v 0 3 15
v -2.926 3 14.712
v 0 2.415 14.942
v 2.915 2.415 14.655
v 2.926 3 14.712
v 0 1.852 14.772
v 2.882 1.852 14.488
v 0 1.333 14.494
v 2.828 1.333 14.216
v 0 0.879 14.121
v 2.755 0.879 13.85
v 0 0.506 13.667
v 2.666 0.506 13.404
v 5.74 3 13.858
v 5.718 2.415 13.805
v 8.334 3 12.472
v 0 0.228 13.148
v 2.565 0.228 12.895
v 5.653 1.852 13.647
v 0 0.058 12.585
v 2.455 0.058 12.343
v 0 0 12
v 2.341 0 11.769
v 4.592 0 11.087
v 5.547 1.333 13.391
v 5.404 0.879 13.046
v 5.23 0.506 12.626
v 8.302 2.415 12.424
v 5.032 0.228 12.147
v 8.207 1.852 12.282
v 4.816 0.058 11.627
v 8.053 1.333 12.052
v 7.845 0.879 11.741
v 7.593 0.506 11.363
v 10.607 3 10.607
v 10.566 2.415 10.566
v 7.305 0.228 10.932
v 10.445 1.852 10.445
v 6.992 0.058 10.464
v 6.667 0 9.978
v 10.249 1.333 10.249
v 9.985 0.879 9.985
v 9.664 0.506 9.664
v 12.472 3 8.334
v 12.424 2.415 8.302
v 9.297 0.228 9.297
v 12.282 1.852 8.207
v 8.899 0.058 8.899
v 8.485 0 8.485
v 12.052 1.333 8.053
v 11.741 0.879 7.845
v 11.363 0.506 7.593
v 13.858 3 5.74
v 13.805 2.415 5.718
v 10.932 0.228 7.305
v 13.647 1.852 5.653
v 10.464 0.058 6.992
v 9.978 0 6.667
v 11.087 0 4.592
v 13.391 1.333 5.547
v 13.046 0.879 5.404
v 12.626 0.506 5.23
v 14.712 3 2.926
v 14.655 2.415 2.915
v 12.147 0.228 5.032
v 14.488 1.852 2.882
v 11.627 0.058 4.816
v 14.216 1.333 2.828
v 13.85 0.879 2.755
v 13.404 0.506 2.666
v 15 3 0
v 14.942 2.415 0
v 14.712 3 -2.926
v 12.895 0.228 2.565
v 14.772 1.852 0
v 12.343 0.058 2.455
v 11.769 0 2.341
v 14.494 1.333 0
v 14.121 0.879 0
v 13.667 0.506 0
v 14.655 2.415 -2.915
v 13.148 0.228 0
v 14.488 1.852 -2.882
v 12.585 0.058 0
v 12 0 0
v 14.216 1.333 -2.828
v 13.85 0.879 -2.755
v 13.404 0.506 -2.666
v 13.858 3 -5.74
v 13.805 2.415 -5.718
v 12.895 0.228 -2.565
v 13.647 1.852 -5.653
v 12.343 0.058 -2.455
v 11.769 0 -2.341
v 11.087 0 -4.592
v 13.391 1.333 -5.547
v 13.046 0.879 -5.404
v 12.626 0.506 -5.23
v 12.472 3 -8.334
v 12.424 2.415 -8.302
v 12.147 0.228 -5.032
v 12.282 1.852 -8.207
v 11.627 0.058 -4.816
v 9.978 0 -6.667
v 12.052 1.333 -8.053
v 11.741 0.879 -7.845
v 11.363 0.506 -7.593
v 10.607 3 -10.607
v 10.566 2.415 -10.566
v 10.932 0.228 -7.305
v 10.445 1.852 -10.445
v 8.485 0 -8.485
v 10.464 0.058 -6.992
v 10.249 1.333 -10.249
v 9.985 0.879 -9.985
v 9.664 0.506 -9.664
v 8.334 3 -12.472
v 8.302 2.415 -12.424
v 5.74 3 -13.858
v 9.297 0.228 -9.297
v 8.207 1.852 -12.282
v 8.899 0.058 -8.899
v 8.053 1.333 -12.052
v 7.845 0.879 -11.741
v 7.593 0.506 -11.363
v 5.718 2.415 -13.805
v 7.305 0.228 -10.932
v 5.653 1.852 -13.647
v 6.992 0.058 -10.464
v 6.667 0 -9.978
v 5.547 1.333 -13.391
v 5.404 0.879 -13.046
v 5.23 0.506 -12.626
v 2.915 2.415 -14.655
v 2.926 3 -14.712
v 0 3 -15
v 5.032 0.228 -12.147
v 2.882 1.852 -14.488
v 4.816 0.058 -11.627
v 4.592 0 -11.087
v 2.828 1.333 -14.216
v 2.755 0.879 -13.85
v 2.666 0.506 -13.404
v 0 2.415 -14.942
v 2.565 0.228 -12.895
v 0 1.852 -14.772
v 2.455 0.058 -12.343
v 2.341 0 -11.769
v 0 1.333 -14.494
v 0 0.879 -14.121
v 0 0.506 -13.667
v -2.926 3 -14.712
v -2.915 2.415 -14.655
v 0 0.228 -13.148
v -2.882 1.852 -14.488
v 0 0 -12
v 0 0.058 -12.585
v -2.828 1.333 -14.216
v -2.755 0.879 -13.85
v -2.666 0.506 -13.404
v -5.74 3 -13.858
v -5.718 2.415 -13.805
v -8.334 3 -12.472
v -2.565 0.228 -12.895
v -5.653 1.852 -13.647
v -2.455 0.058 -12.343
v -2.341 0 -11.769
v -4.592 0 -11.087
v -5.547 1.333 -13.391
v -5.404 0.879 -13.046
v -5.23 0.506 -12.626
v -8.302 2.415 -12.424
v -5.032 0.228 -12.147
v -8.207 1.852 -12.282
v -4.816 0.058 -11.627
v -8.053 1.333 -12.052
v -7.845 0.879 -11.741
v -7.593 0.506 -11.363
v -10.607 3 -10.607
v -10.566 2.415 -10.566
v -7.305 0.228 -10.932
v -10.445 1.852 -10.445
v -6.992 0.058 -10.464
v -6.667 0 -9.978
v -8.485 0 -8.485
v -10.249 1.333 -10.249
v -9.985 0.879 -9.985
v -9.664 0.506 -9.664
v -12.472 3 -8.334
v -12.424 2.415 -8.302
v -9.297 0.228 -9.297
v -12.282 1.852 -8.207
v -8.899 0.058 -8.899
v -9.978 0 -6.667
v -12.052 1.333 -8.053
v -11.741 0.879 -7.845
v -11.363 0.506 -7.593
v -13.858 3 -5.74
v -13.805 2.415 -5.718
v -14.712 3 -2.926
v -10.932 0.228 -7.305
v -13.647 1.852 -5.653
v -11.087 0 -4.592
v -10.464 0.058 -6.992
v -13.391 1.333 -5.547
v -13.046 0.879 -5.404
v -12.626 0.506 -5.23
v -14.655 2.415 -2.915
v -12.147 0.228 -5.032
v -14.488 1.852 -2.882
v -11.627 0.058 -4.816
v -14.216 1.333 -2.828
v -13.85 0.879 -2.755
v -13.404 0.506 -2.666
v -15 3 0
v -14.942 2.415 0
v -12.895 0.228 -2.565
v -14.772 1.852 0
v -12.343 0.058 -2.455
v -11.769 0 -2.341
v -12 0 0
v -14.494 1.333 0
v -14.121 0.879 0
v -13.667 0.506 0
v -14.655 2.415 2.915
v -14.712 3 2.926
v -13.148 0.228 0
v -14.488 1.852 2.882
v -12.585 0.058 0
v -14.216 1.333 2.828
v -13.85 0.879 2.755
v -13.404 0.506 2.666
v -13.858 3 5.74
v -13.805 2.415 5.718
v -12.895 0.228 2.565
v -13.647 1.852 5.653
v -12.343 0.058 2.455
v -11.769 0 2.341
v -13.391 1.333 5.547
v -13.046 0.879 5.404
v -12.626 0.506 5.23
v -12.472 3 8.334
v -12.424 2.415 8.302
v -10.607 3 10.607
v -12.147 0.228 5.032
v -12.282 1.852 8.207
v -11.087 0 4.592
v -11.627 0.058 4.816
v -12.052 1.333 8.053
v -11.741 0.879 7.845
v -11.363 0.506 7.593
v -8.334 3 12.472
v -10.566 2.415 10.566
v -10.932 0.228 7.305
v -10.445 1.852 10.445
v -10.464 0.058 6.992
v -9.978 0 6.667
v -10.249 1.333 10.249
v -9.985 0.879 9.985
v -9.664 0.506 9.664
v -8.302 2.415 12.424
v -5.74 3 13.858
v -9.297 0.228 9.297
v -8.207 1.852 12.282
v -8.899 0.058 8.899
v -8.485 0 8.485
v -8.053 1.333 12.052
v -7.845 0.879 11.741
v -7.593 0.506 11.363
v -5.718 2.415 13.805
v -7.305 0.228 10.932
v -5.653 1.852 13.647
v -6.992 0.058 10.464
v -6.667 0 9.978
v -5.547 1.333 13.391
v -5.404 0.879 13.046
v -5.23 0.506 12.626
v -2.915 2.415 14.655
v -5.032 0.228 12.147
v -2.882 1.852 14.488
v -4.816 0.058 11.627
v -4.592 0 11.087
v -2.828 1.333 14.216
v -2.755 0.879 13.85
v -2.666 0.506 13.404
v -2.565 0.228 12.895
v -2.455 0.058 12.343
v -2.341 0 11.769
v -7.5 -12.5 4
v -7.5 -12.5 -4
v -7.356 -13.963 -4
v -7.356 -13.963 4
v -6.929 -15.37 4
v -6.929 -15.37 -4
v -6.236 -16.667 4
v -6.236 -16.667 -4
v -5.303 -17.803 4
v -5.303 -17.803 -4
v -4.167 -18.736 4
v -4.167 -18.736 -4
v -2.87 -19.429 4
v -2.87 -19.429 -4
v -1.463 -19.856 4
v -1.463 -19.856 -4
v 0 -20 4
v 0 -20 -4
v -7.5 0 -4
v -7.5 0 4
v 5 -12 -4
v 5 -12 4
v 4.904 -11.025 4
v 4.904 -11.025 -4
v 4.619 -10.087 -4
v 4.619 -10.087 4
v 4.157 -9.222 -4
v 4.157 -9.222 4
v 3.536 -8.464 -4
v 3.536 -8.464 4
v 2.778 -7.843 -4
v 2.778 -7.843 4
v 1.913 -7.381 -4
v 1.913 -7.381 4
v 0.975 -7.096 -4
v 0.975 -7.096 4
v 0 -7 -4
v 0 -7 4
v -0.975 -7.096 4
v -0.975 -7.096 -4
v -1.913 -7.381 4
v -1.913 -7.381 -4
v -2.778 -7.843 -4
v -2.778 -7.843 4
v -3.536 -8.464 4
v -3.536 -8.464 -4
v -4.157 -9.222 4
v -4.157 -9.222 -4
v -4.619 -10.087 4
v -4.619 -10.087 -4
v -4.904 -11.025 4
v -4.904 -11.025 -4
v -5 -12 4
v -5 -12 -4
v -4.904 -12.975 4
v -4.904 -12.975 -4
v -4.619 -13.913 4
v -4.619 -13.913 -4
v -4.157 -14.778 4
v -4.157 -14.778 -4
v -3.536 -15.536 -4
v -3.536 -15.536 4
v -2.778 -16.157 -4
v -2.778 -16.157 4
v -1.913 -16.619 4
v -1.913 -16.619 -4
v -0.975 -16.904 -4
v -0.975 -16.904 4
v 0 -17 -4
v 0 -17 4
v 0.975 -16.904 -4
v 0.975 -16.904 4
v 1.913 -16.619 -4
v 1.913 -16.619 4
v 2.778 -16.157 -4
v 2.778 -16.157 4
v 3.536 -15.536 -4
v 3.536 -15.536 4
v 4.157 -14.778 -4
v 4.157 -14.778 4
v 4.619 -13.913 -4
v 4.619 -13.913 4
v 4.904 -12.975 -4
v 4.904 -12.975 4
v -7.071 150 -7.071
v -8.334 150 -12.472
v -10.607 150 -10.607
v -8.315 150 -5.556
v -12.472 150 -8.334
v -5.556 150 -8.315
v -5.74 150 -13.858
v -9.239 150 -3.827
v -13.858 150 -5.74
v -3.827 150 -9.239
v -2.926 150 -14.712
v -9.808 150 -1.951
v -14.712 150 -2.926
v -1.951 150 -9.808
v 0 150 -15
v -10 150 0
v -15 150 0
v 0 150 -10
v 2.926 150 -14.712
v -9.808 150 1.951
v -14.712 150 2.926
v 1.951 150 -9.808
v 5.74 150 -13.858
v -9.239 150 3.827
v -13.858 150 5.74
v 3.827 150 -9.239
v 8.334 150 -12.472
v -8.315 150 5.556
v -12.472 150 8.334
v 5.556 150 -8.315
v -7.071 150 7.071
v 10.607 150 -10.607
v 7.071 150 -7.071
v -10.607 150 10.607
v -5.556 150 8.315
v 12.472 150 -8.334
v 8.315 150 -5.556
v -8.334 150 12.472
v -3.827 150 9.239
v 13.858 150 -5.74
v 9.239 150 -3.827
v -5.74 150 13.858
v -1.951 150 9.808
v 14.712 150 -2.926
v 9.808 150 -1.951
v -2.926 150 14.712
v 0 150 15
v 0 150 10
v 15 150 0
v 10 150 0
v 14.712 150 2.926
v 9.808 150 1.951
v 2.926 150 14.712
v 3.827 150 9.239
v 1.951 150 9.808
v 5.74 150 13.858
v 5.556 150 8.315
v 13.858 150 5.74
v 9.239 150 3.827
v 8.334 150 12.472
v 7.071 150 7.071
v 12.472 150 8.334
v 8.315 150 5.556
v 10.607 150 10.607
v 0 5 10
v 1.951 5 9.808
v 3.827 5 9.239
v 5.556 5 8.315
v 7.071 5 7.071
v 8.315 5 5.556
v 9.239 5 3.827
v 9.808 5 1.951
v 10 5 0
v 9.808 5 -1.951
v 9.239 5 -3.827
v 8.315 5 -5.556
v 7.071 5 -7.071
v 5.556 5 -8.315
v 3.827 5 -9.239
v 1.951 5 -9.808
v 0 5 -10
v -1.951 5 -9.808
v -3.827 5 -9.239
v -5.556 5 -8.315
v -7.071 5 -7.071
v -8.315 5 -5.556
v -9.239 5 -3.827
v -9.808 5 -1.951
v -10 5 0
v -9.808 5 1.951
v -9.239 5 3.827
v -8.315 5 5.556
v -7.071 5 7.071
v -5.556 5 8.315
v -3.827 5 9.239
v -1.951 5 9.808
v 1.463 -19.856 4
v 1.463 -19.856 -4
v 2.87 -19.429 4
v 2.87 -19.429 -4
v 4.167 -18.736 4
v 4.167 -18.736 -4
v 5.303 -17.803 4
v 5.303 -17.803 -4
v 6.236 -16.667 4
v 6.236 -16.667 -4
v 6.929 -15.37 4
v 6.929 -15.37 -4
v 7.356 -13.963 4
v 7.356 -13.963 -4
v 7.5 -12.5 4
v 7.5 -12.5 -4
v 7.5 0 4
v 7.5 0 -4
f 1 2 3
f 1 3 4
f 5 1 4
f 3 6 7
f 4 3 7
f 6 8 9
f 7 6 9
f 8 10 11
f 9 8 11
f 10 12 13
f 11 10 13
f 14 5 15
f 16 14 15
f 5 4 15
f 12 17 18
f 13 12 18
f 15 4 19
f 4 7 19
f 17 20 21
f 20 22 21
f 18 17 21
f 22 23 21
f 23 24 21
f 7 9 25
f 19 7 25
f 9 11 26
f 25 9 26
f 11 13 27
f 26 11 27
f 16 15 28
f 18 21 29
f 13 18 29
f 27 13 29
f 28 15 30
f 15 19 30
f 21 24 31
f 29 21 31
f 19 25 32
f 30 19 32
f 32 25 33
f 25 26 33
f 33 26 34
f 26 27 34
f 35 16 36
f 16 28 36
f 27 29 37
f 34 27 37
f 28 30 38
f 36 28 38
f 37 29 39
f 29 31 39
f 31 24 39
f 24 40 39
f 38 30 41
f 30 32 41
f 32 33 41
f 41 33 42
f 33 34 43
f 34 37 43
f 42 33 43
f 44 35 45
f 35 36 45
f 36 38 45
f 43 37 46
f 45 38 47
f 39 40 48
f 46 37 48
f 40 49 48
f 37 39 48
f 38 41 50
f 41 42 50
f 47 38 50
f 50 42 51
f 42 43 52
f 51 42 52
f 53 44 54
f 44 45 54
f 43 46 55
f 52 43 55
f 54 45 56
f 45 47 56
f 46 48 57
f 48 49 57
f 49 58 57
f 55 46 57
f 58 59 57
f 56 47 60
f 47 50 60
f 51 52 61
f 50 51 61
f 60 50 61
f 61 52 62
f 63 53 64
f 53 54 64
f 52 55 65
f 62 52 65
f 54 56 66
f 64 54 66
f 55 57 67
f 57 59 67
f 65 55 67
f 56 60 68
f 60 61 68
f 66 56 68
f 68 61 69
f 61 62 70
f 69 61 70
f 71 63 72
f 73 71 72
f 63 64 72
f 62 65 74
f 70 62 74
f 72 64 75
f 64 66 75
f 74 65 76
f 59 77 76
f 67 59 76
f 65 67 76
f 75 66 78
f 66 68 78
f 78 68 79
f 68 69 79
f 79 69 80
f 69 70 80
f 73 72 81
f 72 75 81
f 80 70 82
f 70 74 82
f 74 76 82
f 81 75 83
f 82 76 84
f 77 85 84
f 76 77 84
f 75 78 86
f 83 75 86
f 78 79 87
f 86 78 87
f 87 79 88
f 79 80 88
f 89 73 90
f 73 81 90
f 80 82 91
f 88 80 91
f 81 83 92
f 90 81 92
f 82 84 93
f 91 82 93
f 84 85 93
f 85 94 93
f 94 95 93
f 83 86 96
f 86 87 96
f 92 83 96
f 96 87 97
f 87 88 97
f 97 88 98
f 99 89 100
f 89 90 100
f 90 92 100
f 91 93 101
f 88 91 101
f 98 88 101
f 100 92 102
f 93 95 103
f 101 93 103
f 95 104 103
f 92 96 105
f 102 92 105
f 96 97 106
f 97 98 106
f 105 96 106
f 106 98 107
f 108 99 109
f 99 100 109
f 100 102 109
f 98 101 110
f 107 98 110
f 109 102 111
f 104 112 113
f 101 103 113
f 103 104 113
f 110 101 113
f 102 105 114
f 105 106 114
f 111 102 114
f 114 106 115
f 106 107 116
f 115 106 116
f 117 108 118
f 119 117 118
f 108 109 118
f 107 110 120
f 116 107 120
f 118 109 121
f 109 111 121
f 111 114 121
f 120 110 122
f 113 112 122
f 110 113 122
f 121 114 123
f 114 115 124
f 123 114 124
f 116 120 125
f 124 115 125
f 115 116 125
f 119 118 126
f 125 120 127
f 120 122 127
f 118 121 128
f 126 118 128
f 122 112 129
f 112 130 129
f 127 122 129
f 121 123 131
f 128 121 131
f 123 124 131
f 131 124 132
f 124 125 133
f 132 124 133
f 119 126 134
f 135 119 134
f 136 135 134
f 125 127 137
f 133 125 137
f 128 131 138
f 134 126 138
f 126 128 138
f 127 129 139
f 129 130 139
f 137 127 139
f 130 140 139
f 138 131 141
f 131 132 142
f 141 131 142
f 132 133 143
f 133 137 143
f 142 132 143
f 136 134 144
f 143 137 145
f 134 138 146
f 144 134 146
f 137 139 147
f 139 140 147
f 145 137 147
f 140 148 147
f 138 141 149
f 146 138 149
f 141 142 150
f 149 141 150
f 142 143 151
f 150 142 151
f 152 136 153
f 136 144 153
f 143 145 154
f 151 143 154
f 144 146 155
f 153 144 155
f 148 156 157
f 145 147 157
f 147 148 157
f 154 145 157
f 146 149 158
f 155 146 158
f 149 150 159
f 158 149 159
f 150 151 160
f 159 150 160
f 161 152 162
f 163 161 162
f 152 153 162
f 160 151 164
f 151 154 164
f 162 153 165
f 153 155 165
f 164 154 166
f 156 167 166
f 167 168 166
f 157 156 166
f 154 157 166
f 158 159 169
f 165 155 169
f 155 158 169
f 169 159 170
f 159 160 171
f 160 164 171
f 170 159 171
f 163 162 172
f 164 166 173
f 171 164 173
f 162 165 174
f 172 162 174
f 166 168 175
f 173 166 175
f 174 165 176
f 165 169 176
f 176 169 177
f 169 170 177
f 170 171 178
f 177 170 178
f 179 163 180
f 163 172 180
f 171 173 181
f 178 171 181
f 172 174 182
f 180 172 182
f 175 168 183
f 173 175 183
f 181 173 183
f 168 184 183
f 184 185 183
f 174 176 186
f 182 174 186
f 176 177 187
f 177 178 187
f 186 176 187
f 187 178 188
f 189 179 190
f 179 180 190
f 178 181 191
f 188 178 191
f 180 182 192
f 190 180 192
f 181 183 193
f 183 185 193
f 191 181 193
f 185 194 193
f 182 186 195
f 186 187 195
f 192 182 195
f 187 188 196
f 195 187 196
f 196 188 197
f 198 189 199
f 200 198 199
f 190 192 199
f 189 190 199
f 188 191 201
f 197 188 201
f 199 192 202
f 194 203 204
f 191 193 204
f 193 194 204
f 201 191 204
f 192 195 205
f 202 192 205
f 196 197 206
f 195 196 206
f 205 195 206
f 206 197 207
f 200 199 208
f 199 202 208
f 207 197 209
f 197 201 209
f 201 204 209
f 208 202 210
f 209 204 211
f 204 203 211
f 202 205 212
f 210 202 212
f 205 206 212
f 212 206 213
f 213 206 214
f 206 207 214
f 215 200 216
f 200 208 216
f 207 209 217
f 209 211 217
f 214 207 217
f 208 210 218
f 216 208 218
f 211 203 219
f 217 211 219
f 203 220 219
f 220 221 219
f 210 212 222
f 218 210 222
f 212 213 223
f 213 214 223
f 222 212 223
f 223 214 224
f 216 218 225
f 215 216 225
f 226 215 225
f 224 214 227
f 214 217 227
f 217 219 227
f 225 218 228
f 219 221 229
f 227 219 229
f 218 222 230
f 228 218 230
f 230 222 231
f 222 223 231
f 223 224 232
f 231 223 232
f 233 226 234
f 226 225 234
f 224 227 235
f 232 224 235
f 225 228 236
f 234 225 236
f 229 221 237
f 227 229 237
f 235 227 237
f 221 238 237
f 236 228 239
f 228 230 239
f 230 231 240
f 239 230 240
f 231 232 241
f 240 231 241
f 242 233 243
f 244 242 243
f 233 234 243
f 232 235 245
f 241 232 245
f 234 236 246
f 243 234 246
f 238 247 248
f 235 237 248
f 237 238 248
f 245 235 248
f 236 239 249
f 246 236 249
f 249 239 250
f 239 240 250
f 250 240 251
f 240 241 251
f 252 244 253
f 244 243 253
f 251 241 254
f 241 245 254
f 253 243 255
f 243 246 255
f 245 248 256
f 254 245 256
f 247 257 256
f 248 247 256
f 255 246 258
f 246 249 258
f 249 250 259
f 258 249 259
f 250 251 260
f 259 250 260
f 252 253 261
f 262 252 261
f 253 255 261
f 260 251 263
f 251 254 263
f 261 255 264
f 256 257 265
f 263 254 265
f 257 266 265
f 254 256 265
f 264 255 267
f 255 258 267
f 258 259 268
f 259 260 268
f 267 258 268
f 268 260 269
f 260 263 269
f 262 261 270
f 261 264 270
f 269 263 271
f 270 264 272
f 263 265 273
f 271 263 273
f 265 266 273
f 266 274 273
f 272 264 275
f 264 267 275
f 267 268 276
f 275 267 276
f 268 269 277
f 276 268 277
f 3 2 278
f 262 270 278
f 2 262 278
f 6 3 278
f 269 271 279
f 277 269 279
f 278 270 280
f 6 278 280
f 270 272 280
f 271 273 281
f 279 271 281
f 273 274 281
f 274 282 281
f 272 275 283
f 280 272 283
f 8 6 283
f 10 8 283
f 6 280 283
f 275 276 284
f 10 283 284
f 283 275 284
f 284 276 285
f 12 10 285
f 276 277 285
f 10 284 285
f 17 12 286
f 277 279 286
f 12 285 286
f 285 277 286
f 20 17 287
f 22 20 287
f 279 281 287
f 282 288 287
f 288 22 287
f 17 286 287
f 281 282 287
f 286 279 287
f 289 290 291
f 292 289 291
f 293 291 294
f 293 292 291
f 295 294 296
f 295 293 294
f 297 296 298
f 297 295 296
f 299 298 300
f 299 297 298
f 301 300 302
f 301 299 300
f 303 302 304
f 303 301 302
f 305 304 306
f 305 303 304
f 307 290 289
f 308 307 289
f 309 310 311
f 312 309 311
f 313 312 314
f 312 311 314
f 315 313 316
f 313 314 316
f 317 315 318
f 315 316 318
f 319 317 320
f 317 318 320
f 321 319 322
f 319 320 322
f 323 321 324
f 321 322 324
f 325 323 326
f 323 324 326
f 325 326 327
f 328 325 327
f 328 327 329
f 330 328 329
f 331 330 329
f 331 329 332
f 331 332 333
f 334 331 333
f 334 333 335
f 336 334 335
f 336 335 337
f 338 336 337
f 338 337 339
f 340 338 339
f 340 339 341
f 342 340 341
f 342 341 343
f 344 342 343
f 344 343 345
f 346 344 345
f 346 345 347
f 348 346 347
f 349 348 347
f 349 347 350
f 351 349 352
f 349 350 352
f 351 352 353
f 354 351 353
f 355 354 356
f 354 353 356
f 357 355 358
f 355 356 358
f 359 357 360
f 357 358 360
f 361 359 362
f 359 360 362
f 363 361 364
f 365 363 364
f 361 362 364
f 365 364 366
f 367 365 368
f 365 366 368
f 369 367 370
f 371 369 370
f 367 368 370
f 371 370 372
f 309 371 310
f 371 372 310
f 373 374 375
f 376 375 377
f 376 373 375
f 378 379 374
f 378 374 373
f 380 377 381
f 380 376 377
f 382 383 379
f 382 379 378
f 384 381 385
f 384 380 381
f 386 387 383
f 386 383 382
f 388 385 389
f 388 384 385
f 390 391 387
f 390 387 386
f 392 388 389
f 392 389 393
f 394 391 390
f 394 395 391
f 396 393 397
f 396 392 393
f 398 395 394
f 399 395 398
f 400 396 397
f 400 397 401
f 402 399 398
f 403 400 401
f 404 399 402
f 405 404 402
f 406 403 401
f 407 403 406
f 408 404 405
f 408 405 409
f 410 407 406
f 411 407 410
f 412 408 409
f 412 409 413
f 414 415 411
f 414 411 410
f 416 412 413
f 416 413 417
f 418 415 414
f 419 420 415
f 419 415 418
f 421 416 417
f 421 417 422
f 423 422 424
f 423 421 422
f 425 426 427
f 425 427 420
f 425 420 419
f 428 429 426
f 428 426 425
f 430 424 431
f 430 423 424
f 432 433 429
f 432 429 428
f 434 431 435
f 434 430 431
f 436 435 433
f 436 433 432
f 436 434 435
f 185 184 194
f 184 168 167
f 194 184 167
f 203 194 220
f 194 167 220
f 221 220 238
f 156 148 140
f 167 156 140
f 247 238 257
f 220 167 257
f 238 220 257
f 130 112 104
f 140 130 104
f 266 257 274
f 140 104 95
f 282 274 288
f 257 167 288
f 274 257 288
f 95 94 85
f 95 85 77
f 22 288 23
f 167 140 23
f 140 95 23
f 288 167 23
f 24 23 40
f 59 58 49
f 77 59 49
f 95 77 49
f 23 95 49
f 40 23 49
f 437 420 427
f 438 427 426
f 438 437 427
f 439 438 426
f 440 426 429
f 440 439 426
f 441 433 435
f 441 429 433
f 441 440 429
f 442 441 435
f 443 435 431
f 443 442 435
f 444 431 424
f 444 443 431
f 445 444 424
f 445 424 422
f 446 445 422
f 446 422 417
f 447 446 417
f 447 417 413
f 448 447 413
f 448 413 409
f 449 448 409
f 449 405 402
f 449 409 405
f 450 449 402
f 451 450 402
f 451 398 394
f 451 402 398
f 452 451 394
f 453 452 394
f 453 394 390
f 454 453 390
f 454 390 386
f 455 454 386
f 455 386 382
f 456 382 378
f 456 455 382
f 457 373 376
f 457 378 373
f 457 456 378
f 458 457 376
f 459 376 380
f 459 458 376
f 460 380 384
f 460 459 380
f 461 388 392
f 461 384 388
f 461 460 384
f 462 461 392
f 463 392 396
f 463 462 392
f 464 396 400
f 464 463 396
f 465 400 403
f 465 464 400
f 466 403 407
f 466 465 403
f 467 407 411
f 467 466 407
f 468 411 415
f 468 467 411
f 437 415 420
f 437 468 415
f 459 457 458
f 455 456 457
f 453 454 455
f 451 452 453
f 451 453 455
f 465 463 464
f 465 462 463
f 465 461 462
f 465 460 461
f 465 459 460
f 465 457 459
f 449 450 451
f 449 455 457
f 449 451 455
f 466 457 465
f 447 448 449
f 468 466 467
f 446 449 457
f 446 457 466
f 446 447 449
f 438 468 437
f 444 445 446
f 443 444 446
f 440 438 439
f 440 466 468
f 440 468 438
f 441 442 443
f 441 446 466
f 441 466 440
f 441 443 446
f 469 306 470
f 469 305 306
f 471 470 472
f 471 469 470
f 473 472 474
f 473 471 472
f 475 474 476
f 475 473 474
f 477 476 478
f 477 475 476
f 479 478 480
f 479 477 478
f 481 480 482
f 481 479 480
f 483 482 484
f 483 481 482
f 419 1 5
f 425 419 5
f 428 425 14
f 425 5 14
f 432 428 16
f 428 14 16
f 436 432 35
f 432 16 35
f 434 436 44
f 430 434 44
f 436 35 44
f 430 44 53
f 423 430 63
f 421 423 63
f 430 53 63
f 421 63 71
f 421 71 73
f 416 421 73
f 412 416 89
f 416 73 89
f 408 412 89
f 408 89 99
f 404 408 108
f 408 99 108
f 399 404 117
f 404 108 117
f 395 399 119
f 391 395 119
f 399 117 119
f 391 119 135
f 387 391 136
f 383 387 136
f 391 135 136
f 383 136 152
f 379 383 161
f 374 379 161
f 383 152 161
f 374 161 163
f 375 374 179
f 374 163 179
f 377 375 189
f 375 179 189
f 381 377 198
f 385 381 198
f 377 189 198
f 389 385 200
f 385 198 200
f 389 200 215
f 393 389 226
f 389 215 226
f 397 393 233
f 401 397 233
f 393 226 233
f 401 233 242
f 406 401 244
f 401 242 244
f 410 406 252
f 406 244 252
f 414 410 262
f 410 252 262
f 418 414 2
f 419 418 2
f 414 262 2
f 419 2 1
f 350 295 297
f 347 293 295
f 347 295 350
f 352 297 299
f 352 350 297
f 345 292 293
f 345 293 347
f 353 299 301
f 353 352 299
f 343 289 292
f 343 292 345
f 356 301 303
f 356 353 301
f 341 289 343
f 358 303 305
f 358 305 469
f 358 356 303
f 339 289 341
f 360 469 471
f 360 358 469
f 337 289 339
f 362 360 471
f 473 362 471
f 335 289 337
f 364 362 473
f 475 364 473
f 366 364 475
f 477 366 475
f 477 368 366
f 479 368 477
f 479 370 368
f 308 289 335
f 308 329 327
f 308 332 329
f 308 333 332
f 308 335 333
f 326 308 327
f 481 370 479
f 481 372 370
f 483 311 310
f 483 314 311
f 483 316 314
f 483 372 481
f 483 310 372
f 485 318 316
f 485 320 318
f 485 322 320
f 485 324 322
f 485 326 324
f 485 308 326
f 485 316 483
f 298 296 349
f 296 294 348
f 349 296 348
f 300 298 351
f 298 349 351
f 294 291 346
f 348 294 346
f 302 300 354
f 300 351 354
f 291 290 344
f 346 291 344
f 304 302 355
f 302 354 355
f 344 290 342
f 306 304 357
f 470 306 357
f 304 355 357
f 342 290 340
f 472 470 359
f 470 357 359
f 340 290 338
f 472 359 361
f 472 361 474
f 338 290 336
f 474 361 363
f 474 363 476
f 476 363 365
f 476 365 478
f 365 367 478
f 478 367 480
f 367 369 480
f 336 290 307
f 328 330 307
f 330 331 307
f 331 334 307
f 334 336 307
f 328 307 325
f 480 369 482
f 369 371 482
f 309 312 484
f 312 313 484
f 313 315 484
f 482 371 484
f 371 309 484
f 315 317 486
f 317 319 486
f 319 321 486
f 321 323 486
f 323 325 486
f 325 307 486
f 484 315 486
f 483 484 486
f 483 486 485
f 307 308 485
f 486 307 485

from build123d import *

# Parameters (mm, degrees)
SKETCH1_R           = 15
BOSS_EXTRUDE1_DEPTH = 150
SHELL1_T            = -5
FILLET1_R           = 3
SKETCH2_W           = 15
SKETCH2_H           = 8
BOSS_EXTRUDE2_DEPTH = 20
SKETCH3_R           = 5
CUT_EXTRUDE1_DEPTH  = 152.940777937
FILLET3_R           = 7.5


with BuildPart() as part:
    # Sketch1 → Boss-Extrude1 (new body)
    with BuildSketch(Plane(origin=(0, 0, 0), x_dir=(1, 0, 0), z_dir=(0, 1, 0))):
        with Locations(Location((0, 0, 0), (0, 0, 270))):
            Circle(SKETCH1_R)
    extrude(amount=BOSS_EXTRUDE1_DEPTH)

    # Shell1
    shell1_openings = [part.faces().sort_by_distance(p)[0] for p in [
        (0, 150, 0),
    ]]
    offset(amount=SHELL1_T, openings=shell1_openings, kind=Kind.INTERSECTION)

    # Fillet1
    fillet1_edges = [part.edges().sort_by_distance(p)[0] for p in [
        (0, 0, -15),
    ]]
    fillet(fillet1_edges, radius=FILLET1_R)


with BuildPart() as body_2:
    # Sketch2 → Boss-Extrude2 (new body)
    with BuildSketch(Plane.XZ):
        Rectangle(SKETCH2_W, SKETCH2_H)
    extrude(amount=BOSS_EXTRUDE2_DEPTH)

    # Sketch3 → Cut-Extrude1 (cut, through all)
    with BuildSketch(Plane.XY.offset(4)):
        with Locations((0, -12)):
            Circle(SKETCH3_R)
    extrude(amount=-CUT_EXTRUDE1_DEPTH, mode=Mode.SUBTRACT)

    # Fillet3
    fillet3_edges = [body_2.edges().sort_by_distance(p)[0] for p in [
        (7.5, -20, 0),
        (-7.5, -20, 0),
    ]]
    fillet(fillet3_edges, radius=FILLET3_R - 0.0001)  # a hair under: the kernel refuses the full size


solid = Compound([part.part, body_2.part])
